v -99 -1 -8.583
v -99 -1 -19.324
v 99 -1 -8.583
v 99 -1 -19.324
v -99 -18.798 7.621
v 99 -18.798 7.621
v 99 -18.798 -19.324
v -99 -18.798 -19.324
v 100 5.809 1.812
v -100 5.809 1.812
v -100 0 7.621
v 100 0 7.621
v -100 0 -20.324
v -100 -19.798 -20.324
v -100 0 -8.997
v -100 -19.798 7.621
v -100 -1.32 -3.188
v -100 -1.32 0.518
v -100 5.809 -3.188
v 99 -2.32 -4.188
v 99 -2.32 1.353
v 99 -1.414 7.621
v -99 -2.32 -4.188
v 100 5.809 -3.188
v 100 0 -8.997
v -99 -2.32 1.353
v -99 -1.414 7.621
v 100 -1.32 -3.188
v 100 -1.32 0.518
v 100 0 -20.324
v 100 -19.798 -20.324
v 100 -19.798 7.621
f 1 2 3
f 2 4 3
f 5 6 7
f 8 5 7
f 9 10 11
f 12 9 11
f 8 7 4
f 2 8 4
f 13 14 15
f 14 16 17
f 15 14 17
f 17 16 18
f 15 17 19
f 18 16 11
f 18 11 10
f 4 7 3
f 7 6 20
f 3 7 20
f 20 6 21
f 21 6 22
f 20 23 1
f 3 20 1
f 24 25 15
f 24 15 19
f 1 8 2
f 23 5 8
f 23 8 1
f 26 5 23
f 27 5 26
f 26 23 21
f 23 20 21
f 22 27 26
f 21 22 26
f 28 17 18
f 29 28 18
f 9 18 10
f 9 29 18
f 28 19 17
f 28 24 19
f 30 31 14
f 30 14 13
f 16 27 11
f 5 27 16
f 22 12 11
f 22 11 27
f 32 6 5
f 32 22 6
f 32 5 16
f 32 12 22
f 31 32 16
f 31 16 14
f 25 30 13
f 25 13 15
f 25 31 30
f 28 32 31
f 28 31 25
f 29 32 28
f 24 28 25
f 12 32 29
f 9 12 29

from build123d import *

# Parameters (mm, degrees)
F1_DEPTH = 100
F2_T     = -1
F4_DEPTH = 198


with BuildPart() as f1:
    # F0 (on Right) → F1 (new body, symmetric)
    with BuildSketch(Plane.YZ):
        Polygon((5.8090751991, 1.8115955126), (0, 1.8115955126), (-1.3203158755, 1.8115955126), (-1.3203158755, 0.5179099389), align=None)
        Polygon((-1.3203158755, 1.8115955126), (0, 1.8115955126), (5.8090751991, 1.8115955126), (0, 7.6206707116), (-19.7975447644, 7.6206707116), (-19.7975447644, -20.3238854808), (0, -20.3238854808), (0, -8.9974796865), (0, -3.1884044874), (-1.3203158755, -3.1884044874), (-1.3203158755, 0.5179099389), align=None)
        Polygon((5.8090751991, -3.1884044874), (0, -3.1884044874), (0, -8.9974796865), align=None)
    extrude(amount=F1_DEPTH, both=True)

    # F2
    f2_openings = [f1.faces().sort_by_distance(p)[0] for p in [
        (0, -9.898772, 7.620671),
    ]]
    offset(amount=F2_T, openings=f2_openings, kind=Kind.INTERSECTION)

    # F3 (on face) → F4 (join, through all)
    with BuildSketch(Plane.YZ.offset(-99)):
        Polygon((-1.4142135624, 7.6206707116), (-2.3203158755, 1.3527820438), (3.7518344093, 2.4546227399), align=None)
        Polygon((3.3948616367, -4.1884044874), (-2.3203158755, -4.1884044874), (-1, -8.5832661241), align=None)
    extrude(amount=F4_DEPTH)


solid = f1.part
